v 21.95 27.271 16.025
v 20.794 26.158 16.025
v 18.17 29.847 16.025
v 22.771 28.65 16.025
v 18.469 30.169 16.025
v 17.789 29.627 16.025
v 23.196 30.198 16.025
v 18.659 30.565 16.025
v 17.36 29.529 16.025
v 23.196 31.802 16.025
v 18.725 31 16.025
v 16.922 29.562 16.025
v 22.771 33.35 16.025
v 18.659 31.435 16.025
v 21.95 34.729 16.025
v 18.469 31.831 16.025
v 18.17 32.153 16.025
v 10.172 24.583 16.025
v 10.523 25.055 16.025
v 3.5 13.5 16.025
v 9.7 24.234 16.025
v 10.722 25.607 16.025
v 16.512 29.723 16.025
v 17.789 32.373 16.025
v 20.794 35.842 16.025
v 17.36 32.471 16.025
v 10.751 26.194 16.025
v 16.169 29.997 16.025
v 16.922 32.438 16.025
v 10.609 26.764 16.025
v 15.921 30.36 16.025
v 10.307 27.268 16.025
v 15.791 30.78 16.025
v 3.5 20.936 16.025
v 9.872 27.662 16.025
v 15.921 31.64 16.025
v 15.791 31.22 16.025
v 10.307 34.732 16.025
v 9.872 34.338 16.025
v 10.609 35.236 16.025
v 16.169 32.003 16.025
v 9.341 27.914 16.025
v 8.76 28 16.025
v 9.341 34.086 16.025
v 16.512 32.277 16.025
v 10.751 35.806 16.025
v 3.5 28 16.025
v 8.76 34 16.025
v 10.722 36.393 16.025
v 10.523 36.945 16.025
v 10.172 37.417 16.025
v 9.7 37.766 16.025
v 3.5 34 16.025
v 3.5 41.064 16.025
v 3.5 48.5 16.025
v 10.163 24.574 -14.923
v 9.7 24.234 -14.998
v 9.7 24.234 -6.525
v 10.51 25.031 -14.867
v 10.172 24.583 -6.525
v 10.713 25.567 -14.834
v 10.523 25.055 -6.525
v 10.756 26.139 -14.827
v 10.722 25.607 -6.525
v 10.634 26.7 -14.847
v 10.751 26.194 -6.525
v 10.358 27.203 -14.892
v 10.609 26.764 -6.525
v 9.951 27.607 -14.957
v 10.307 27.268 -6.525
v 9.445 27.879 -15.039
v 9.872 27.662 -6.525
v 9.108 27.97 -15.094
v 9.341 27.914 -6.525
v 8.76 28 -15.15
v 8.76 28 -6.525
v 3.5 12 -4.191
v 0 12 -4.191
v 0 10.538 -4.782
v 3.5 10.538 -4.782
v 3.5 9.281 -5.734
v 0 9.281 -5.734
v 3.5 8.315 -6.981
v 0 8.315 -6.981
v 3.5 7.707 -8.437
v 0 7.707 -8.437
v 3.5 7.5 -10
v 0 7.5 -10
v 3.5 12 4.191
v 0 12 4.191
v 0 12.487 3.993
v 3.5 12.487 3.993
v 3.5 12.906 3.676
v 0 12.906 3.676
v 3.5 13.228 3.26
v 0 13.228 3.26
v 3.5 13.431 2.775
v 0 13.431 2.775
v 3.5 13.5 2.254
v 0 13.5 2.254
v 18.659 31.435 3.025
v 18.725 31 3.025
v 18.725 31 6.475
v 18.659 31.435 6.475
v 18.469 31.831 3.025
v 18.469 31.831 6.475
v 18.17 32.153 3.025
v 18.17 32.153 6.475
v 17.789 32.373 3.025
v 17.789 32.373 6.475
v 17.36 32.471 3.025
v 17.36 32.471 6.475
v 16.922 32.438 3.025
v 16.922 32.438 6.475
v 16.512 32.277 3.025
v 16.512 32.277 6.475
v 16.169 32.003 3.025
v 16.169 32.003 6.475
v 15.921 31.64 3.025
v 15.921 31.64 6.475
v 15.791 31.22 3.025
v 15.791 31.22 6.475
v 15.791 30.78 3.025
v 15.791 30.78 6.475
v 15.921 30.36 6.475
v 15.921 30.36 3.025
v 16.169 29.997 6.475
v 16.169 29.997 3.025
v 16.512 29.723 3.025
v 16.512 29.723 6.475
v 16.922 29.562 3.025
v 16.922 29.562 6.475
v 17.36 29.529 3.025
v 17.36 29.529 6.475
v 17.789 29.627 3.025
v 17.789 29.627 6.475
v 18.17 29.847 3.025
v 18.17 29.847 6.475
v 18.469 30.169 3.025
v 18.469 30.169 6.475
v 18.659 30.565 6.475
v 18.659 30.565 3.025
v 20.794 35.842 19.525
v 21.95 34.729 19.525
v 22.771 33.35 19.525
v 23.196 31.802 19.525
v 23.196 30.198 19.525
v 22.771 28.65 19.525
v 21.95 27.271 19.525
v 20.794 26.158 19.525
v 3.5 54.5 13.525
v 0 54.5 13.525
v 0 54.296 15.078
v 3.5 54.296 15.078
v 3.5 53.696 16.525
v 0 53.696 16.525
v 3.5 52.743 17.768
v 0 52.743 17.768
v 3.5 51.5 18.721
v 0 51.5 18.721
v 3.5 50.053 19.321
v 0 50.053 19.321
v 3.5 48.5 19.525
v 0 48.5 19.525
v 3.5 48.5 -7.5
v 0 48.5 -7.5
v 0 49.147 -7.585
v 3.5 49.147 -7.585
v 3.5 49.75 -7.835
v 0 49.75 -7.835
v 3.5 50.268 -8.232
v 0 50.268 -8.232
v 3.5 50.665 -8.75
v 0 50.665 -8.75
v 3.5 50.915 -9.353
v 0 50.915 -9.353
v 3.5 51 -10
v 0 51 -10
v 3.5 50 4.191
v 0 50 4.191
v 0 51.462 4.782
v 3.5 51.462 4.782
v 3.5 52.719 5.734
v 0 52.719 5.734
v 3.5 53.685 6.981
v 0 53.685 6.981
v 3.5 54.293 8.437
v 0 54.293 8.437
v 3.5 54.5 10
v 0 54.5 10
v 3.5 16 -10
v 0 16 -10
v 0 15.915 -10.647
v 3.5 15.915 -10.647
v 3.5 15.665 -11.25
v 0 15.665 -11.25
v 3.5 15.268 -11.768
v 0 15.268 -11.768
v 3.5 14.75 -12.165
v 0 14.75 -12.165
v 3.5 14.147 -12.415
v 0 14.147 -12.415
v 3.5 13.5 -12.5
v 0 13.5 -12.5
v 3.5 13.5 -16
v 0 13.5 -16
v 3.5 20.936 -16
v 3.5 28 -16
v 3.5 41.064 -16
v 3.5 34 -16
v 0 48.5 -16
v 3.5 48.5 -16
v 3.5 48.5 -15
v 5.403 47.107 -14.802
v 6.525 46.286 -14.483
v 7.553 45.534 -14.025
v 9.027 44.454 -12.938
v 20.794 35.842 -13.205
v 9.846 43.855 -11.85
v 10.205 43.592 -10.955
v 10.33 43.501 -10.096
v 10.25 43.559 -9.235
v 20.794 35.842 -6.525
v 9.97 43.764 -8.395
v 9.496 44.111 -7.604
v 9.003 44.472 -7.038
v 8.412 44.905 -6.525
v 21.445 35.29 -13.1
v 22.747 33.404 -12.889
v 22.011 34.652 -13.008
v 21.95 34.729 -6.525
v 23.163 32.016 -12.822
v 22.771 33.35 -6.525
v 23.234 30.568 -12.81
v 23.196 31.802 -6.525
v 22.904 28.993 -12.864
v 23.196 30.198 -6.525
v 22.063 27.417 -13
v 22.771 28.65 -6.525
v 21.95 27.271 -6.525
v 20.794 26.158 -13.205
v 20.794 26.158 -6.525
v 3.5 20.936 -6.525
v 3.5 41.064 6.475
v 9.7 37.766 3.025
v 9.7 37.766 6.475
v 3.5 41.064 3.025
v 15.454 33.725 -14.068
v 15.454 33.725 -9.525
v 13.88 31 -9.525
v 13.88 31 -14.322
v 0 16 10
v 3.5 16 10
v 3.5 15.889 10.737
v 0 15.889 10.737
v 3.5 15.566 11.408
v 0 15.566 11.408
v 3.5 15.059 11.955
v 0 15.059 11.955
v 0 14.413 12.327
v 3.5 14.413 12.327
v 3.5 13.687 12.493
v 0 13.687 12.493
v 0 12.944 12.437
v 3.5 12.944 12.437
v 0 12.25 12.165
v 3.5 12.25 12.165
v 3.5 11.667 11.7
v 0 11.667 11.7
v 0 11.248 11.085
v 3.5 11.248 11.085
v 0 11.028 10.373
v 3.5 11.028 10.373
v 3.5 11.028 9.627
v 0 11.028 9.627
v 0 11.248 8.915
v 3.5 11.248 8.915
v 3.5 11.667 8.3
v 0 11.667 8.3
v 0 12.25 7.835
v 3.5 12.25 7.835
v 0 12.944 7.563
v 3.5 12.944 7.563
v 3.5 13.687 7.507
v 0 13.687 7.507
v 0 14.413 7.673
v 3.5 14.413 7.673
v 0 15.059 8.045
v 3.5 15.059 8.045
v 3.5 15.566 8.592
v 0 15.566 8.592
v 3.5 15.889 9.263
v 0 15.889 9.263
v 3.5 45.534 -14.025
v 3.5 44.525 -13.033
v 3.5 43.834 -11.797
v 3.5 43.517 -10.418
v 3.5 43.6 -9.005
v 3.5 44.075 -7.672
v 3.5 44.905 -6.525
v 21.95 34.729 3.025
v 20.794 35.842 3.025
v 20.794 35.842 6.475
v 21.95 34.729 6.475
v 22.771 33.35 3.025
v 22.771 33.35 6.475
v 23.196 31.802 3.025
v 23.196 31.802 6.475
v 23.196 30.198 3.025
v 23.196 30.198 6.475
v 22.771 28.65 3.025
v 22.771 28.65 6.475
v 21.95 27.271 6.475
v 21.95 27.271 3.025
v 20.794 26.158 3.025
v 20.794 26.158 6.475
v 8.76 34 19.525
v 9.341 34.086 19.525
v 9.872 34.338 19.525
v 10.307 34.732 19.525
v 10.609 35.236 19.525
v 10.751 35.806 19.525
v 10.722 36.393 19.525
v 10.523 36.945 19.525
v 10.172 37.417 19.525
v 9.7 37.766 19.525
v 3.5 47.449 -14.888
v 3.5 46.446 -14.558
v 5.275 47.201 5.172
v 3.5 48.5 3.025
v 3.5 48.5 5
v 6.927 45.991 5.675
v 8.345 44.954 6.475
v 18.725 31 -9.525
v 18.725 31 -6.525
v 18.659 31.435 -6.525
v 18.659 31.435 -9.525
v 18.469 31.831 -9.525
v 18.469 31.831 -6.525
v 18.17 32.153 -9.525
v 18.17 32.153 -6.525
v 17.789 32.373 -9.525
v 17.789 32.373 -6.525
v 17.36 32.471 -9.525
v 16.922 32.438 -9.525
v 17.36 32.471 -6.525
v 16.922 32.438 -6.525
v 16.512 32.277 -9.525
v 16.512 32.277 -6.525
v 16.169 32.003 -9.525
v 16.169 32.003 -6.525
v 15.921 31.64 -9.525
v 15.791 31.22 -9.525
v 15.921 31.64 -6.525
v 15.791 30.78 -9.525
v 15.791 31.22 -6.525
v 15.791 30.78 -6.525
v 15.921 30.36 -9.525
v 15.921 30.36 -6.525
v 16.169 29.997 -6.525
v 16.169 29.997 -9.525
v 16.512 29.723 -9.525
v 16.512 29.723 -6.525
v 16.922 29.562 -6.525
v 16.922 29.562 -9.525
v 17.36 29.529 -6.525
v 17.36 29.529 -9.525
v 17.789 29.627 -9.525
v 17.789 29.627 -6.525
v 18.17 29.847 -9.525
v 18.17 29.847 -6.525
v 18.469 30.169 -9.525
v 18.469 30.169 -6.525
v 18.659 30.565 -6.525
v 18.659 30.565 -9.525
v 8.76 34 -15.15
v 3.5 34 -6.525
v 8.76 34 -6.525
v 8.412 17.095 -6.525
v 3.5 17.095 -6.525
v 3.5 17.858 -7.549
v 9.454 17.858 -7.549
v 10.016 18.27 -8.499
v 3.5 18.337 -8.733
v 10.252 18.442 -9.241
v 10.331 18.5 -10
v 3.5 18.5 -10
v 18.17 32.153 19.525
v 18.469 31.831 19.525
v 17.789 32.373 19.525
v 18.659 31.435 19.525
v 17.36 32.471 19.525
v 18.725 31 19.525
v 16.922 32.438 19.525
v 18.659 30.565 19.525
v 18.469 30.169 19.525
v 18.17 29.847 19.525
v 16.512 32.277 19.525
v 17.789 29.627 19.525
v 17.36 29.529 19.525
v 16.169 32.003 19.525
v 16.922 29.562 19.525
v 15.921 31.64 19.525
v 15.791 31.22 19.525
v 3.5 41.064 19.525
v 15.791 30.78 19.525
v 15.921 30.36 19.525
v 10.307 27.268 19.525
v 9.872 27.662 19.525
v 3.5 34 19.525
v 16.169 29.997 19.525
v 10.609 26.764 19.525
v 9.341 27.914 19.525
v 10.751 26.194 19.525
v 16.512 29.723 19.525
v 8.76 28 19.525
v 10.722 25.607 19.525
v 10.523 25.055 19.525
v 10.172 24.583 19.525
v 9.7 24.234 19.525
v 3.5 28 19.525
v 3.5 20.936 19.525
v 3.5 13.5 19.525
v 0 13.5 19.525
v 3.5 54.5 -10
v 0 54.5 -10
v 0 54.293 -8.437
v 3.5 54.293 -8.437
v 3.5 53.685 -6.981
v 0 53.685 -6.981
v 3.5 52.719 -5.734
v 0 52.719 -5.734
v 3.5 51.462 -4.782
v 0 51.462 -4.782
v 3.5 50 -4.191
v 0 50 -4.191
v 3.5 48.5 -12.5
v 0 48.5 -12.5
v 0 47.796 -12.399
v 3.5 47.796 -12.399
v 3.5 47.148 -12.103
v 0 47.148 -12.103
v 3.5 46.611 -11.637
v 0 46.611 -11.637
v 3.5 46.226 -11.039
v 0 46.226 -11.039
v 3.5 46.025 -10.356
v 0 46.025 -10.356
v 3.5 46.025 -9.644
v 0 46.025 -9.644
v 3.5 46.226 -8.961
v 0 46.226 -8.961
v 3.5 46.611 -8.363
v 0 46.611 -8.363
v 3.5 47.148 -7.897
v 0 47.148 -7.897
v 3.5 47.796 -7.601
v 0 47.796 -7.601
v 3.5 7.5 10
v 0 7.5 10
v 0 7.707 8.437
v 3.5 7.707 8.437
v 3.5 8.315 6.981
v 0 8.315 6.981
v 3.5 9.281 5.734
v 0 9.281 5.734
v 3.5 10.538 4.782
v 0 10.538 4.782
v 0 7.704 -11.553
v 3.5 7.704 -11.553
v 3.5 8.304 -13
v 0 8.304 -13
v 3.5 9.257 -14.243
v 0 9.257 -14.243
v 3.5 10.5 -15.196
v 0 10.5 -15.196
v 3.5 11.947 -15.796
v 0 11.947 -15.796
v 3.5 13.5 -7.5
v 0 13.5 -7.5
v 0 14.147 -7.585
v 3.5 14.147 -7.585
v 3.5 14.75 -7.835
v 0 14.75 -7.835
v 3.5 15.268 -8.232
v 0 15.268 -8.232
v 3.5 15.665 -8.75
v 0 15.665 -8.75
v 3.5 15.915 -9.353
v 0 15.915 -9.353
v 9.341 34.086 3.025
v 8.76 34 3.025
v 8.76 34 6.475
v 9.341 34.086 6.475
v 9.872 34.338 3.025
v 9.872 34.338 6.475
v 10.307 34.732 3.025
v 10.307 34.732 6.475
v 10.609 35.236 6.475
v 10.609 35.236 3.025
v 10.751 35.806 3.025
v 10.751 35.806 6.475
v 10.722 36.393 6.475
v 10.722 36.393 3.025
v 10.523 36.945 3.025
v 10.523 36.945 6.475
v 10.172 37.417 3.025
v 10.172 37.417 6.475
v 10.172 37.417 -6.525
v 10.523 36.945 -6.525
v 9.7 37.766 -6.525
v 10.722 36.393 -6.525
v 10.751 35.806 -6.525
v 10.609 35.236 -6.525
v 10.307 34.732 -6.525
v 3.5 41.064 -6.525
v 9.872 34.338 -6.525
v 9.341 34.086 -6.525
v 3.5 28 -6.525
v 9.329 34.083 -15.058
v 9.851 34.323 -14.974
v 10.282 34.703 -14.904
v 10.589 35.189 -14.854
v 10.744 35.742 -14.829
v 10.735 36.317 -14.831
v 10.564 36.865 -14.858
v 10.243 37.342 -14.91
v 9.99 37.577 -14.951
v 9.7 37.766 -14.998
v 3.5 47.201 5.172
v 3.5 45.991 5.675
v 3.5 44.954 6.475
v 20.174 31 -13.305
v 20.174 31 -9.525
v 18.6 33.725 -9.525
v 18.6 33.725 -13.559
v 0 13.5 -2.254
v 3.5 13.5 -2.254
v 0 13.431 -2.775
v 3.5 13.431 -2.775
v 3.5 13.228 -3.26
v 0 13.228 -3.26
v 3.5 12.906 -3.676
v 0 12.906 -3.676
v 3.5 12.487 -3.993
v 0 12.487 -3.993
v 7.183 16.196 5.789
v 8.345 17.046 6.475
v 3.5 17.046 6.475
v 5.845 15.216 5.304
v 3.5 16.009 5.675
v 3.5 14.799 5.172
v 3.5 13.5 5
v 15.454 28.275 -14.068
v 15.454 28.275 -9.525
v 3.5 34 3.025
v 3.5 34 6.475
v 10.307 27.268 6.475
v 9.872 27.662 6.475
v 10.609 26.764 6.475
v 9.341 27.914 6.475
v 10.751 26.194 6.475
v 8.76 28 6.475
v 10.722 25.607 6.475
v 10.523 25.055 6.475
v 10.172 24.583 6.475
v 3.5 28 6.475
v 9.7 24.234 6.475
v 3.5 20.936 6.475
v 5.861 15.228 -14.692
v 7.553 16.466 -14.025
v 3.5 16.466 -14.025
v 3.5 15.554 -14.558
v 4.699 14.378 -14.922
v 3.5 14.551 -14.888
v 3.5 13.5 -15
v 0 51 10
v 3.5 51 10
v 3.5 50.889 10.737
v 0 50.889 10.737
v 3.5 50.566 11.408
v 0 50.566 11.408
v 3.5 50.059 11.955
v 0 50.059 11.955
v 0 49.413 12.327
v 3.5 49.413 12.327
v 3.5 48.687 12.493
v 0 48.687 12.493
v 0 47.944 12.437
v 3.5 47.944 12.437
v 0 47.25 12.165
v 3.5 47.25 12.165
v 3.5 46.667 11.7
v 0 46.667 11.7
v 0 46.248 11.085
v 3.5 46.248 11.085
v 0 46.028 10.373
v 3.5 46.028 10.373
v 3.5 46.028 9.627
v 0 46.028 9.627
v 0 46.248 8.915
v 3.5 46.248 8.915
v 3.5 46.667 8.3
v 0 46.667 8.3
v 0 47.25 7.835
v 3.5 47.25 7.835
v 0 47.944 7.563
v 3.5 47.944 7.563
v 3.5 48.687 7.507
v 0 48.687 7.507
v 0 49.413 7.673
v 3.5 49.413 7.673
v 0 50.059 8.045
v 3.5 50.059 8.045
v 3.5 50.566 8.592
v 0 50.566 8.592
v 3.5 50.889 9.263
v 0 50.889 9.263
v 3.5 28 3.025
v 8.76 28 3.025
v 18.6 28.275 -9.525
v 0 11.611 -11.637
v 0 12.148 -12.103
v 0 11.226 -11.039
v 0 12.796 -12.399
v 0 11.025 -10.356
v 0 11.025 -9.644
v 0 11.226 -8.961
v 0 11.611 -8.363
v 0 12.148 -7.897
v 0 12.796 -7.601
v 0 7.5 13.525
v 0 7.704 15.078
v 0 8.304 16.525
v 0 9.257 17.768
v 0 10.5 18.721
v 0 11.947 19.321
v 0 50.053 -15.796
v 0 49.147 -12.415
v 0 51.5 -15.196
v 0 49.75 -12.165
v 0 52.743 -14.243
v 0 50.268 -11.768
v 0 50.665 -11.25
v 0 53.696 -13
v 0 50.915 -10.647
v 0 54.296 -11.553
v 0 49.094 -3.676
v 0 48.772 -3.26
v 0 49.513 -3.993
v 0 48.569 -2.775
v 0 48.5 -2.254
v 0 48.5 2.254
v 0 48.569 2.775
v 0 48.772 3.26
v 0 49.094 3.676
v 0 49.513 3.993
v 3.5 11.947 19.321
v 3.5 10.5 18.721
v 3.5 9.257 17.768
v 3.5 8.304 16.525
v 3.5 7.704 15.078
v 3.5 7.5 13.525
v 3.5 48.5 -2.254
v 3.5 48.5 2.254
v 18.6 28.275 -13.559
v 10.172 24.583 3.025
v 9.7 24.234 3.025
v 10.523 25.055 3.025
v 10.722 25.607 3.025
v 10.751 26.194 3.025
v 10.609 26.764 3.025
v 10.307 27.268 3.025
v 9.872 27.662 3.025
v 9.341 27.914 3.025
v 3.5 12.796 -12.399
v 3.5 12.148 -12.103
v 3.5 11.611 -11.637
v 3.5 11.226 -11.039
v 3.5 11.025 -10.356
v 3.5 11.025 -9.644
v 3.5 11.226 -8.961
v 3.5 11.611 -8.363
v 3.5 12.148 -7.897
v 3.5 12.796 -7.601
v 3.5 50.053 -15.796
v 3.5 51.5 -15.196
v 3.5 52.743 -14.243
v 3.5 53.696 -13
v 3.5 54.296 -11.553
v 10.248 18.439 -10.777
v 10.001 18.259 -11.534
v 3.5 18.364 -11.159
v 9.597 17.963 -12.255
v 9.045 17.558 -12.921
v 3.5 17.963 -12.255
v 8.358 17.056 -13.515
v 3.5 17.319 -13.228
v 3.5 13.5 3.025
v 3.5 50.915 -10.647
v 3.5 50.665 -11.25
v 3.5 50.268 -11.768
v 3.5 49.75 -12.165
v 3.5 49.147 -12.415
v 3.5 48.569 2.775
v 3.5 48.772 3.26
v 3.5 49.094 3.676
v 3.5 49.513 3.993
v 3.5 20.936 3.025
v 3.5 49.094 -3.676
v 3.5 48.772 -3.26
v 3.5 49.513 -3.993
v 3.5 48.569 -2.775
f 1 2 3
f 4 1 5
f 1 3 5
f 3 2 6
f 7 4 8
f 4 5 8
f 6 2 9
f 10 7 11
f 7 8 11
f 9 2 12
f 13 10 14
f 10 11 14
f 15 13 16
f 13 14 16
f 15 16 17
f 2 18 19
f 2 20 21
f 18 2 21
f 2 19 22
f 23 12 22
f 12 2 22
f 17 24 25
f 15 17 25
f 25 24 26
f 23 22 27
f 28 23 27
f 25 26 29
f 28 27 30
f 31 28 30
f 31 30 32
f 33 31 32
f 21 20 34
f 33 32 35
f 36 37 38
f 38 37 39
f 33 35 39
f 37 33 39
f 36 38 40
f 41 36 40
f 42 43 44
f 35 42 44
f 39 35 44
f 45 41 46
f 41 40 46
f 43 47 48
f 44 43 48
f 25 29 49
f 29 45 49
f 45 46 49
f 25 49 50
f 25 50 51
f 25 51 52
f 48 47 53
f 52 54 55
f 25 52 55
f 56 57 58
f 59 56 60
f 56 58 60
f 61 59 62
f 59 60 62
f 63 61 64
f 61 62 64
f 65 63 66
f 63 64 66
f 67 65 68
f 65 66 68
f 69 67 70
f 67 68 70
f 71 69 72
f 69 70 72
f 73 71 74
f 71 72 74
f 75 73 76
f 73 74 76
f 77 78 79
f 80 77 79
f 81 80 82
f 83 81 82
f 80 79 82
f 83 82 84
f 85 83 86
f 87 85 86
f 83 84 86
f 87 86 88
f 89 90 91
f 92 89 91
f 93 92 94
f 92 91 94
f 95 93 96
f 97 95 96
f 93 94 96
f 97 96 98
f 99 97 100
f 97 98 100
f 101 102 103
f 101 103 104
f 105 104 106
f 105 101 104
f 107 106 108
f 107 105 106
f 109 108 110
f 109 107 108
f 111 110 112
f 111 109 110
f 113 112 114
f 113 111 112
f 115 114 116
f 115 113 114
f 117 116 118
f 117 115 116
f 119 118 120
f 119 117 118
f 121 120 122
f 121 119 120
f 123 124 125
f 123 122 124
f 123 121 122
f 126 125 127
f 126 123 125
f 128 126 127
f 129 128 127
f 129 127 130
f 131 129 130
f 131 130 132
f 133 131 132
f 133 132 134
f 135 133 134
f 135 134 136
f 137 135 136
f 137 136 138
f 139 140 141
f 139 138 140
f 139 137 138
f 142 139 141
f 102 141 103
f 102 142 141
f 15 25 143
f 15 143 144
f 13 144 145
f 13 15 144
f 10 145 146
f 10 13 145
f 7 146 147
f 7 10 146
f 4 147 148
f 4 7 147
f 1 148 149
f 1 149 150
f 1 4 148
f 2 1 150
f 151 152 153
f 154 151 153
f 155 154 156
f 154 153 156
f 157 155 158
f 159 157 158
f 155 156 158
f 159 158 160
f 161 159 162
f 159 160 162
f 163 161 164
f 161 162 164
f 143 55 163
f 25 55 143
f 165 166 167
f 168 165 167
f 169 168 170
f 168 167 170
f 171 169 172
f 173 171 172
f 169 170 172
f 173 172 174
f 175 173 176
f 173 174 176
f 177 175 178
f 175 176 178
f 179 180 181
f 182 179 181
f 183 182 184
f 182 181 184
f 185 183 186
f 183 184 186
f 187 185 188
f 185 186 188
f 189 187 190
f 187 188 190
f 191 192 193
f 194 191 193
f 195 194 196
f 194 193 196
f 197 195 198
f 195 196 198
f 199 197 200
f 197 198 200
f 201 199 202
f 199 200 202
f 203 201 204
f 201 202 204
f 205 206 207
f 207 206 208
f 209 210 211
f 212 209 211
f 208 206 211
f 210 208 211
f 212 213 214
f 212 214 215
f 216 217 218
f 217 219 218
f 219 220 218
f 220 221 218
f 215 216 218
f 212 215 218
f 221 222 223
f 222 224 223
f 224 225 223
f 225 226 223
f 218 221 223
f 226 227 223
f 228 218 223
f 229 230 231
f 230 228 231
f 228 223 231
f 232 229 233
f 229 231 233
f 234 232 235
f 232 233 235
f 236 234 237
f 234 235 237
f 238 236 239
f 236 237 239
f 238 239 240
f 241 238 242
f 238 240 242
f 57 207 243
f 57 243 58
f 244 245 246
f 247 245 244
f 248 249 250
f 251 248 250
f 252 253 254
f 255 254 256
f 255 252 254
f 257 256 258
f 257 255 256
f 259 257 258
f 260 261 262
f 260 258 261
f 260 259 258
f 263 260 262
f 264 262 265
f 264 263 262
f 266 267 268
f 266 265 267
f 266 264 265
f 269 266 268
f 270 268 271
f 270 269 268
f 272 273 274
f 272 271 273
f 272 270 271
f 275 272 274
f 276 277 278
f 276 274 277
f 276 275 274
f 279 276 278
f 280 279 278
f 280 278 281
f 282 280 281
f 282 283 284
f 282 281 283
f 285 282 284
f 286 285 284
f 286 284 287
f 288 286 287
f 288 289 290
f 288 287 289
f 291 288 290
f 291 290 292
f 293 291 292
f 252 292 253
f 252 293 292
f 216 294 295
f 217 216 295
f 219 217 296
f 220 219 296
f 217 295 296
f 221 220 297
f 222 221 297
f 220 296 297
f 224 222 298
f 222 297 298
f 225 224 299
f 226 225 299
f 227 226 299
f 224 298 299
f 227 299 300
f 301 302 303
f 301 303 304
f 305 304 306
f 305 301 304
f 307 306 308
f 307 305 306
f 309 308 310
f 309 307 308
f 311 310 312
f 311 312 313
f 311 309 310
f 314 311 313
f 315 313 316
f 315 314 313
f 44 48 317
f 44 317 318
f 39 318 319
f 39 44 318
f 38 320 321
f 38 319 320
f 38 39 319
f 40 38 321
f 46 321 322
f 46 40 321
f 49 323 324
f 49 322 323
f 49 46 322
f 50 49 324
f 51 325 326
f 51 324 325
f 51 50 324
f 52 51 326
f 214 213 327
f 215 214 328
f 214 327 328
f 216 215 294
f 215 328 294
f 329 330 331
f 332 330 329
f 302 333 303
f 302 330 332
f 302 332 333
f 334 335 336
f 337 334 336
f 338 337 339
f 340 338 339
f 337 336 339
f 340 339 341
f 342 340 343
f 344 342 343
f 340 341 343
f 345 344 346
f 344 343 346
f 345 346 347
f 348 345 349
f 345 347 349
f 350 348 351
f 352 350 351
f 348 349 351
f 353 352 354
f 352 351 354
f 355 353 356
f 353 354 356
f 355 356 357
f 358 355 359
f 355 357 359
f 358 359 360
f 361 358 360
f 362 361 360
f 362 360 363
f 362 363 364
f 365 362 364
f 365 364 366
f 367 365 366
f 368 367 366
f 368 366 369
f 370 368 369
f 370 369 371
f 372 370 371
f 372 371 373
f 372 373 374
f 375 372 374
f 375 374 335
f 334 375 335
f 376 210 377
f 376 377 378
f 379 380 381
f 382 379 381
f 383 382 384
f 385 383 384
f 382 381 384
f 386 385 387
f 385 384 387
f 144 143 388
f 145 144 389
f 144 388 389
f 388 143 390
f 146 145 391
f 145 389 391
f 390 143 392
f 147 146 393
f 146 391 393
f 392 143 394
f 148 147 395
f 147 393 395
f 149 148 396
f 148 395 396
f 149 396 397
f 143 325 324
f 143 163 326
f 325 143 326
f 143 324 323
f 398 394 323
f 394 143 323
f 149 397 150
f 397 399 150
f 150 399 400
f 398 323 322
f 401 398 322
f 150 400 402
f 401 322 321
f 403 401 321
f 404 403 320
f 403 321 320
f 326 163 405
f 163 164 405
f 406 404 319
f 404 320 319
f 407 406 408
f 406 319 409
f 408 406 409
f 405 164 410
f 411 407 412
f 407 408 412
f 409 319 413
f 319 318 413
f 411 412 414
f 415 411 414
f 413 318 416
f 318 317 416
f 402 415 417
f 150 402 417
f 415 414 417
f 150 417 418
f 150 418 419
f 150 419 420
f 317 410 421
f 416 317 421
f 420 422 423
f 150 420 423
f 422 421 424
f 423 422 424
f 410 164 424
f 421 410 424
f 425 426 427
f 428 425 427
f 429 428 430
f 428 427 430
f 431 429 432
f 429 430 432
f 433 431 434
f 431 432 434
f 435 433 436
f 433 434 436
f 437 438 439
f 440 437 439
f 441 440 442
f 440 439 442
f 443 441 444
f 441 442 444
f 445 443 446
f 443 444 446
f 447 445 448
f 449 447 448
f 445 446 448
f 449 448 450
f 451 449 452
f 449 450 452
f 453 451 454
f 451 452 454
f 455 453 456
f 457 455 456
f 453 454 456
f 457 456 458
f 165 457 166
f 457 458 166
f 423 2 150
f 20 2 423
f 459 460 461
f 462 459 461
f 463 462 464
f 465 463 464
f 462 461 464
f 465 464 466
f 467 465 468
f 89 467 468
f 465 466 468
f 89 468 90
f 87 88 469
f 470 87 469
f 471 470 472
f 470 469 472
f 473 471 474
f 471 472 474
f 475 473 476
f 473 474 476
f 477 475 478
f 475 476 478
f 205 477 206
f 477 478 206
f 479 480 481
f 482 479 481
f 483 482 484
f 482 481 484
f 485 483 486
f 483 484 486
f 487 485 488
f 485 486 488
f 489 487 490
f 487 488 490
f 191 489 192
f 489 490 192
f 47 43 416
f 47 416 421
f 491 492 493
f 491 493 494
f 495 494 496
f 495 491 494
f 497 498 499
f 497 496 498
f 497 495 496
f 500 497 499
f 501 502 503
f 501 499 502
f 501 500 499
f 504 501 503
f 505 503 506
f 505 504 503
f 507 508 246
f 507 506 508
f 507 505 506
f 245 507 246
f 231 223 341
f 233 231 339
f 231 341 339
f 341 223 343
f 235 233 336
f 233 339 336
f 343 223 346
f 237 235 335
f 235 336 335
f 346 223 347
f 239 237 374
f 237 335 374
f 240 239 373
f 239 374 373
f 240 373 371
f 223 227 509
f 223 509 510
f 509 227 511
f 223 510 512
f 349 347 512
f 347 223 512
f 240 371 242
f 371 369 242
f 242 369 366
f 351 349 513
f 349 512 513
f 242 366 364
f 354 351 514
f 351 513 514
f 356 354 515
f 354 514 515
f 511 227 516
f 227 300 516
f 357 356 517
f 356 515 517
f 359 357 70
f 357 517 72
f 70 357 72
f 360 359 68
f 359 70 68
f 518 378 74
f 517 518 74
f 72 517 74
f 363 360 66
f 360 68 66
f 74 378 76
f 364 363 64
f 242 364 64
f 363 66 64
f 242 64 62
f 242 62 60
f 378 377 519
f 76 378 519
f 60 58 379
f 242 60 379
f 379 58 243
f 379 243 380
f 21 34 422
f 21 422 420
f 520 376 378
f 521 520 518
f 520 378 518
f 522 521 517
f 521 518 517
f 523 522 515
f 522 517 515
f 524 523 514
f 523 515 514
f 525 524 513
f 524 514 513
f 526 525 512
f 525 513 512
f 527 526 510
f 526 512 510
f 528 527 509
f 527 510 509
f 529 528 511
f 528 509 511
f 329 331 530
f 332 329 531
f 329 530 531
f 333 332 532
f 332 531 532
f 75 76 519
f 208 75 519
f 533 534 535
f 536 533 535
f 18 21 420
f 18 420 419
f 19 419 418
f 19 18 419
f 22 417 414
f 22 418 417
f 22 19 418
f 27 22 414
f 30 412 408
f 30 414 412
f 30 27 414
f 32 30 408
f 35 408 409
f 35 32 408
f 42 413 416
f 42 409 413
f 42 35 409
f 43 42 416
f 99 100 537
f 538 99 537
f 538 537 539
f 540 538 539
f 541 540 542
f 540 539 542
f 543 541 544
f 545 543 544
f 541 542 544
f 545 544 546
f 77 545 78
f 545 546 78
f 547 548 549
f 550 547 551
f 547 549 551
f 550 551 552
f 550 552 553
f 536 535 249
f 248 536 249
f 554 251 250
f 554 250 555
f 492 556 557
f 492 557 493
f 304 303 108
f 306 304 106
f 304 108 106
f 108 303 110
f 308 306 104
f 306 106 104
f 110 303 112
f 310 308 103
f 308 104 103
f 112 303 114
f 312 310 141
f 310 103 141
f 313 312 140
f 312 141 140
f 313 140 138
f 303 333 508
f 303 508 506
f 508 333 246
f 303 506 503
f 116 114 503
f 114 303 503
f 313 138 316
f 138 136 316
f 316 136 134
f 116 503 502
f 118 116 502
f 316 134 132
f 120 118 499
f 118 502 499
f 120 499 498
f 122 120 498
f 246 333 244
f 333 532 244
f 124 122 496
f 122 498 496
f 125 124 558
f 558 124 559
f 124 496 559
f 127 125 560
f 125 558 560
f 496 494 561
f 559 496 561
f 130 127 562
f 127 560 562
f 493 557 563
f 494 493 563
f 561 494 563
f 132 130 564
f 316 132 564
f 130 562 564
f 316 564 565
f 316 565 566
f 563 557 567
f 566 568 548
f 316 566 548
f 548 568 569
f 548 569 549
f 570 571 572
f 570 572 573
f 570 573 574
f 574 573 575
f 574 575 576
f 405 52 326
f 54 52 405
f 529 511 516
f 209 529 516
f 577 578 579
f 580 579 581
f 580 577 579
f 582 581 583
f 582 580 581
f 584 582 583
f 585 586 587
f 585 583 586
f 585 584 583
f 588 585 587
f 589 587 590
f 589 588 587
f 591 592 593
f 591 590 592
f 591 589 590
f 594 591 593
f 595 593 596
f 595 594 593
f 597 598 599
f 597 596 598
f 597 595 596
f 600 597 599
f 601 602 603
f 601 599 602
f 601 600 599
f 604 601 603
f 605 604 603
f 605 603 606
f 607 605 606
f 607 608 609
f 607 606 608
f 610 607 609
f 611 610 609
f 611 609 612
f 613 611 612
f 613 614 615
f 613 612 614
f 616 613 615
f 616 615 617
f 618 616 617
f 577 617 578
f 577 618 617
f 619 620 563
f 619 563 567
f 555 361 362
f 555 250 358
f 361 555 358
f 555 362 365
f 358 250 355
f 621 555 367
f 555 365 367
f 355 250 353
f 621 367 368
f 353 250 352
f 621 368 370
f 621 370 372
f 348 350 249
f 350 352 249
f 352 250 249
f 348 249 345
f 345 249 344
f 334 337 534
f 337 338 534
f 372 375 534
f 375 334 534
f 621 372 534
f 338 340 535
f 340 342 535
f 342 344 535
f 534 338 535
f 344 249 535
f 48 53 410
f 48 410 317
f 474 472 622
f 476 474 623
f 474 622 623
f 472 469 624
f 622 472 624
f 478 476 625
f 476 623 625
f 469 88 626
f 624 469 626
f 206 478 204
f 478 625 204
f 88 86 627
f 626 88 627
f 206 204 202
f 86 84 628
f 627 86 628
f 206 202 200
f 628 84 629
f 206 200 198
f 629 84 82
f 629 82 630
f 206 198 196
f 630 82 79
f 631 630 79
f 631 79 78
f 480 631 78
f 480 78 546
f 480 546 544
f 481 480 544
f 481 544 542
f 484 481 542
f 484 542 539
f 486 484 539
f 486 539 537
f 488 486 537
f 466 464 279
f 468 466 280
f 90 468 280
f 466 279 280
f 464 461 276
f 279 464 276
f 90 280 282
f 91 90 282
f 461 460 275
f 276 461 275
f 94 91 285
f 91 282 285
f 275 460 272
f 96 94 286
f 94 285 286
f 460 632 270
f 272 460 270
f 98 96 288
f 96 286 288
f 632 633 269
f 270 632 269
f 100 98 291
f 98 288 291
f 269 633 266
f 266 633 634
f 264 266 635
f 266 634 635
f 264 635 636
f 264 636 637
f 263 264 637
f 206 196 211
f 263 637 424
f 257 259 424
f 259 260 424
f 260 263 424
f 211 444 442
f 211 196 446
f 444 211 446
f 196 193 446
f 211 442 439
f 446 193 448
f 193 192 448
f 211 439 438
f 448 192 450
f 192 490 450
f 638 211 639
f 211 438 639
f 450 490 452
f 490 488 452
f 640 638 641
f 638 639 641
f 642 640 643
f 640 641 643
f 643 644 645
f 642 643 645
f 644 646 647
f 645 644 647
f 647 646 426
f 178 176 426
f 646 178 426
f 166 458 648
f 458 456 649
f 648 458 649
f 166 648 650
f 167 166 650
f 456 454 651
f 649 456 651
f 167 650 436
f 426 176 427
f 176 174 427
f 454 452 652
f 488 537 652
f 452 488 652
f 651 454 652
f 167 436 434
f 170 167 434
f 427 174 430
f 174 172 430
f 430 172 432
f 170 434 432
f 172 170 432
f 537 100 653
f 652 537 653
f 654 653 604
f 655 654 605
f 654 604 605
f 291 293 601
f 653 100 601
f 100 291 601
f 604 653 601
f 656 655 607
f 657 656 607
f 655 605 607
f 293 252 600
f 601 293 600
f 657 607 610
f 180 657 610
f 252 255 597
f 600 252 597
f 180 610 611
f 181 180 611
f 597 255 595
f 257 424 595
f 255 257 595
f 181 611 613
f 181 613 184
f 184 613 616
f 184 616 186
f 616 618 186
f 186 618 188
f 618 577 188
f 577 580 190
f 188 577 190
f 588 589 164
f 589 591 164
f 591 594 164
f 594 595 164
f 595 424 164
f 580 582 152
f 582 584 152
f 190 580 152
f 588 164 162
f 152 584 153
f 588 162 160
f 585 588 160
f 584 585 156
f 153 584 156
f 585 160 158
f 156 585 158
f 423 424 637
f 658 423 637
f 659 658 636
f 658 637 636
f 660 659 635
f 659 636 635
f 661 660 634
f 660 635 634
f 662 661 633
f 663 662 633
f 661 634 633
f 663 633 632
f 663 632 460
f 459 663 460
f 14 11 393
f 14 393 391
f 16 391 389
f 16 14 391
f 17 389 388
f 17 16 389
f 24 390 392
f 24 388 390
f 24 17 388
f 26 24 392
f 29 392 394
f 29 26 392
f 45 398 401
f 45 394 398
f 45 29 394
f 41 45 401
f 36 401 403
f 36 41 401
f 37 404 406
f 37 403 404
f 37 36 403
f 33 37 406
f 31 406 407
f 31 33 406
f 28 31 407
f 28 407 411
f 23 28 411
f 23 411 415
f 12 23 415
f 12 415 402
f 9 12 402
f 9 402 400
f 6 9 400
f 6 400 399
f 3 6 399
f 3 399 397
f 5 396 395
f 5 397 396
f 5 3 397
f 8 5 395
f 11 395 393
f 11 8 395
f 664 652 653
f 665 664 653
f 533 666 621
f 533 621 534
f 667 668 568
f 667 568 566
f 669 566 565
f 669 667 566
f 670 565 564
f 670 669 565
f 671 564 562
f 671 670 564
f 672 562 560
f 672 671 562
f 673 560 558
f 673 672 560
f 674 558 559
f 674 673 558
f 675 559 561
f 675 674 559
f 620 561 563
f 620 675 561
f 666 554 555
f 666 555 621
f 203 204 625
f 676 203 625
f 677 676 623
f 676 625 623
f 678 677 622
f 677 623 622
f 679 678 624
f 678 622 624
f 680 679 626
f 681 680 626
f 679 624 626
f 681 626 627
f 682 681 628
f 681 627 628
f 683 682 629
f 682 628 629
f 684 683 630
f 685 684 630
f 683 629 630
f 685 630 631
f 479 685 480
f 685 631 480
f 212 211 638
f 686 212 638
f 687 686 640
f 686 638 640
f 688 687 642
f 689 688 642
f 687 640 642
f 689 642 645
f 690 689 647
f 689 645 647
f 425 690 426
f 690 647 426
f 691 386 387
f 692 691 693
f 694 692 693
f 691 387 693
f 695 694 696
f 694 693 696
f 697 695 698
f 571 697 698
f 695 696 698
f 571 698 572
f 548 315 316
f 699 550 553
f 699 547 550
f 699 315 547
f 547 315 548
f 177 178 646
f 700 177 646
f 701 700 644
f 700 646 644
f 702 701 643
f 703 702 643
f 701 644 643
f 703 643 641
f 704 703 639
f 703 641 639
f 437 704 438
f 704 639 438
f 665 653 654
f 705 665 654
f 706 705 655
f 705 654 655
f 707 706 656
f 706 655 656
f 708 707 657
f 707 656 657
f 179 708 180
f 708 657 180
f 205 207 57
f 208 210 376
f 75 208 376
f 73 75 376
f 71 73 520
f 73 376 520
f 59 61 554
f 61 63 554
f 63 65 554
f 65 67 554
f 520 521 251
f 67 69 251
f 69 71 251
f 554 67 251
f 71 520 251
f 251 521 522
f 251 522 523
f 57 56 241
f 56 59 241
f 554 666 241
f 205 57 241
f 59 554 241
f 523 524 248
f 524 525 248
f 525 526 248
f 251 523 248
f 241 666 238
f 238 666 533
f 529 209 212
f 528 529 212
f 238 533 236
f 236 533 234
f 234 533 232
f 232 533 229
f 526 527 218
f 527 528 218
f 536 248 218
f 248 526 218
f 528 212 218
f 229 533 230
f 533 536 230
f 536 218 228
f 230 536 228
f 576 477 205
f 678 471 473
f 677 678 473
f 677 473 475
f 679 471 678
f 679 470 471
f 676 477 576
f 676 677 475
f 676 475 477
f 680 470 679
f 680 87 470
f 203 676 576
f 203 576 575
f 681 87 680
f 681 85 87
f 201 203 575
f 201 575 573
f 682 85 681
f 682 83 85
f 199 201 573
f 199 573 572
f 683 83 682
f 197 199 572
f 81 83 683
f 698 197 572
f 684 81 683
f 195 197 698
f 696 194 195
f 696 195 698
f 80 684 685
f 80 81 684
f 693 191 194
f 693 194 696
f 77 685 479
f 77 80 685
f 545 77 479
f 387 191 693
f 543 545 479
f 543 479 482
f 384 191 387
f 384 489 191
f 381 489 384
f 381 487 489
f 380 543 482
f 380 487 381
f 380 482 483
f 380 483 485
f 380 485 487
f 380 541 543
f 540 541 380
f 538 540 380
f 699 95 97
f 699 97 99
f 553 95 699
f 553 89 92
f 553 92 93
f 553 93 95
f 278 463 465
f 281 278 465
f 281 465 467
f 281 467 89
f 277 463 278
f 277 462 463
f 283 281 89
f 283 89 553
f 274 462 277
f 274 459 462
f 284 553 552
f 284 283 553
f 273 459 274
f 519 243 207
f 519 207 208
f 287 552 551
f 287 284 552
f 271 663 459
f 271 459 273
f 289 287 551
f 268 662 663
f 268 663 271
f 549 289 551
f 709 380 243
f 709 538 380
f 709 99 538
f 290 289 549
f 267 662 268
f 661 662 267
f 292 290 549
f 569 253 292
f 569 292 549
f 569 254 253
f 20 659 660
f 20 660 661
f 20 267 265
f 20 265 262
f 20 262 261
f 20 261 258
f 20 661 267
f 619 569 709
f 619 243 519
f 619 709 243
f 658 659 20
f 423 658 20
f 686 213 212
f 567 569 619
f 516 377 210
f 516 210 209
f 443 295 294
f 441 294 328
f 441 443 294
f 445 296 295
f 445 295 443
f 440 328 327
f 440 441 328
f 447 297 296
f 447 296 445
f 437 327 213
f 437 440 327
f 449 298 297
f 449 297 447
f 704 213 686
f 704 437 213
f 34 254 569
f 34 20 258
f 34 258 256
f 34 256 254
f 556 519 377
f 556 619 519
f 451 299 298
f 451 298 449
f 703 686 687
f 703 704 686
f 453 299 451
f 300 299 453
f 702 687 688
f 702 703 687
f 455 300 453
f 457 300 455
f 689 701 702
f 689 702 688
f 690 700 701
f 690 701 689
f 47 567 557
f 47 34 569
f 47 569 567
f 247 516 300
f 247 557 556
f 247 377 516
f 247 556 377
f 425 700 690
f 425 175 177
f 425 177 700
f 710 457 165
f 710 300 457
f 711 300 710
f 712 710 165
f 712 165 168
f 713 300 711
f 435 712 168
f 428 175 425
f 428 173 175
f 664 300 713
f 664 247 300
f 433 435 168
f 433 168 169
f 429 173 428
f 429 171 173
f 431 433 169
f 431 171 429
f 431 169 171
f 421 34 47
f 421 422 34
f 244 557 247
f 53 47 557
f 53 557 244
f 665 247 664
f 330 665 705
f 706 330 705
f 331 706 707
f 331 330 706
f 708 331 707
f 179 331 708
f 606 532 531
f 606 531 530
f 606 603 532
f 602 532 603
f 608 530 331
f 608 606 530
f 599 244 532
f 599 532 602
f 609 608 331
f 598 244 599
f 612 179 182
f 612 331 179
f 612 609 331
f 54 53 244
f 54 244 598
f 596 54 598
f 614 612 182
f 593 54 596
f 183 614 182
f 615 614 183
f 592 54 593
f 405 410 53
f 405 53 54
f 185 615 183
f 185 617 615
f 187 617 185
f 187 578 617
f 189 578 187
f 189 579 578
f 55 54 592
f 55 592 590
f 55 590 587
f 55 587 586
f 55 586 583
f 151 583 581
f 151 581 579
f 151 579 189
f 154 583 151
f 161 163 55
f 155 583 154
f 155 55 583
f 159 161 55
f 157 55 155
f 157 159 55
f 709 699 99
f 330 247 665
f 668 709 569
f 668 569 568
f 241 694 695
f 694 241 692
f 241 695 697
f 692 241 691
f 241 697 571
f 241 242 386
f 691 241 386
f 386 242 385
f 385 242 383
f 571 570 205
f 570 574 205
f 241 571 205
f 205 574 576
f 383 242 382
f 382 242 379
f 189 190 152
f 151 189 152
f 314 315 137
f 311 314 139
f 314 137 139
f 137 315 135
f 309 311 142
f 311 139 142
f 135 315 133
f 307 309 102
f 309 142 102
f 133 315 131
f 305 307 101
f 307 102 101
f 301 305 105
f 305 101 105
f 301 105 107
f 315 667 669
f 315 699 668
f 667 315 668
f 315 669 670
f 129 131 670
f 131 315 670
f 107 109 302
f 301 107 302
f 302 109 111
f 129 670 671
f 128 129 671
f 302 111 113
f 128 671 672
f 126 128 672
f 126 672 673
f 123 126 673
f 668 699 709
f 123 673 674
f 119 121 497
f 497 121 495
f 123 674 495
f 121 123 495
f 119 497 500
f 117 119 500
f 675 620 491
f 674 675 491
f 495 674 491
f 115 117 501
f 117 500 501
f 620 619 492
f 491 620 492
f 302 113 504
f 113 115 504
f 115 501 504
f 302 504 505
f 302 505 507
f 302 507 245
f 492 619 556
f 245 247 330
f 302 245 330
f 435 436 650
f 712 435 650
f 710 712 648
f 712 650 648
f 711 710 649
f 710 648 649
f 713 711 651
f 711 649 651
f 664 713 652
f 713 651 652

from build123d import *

# Parameters (mm, degrees)
F0_R          = 2.5
F1_DEPTH      = 3.5
F0_W          = 5.5
F0_H          = 4
F2_DEPTH      = 25
F4_DEPTH      = 47.001
F5_R          = 1.475
F6_DEPTH      = 16.001
F6_DEPTH_BACK = 19.526
F8_R          = 1.475
F9_DEPTH      = 6.476


with BuildPart() as f1:
    # F0 (on Right) → F1 (new body)
    with BuildSketch(Plane.YZ):
        with BuildLine():
            Line((48.5, -15), (48.5, -16))
            ThreePointArc((48.5, -16), (52.7426406871, -14.2426406871), (54.5, -10))
            ThreePointArc((54.5, -10), (53.2434164903, -6.3257653858), (50, -4.1905249807))
            ThreePointArc((50, -4.1905249807), (48.9188611699, -3.478778179), (48.5, -2.2540333076))
            Line((48.5, -2.2540333076), (48.5, 2.2540333076))
            ThreePointArc((48.5, 2.2540333076), (48.9188611699, 3.478778179), (50, 4.1905249807))
            ThreePointArc((50, 4.1905249807), (53.2434164903, 6.3257653858), (54.5, 10))
            Line((54.5, 10), (54.5, 13.525))
            ThreePointArc((54.5, 13.525), (52.7426406871, 17.7676406871), (48.5, 19.525))
            Line((48.5, 19.525), (48.5, 16.025))
            Line((48.5, 16.025), (13.5, 16.025))
            Line((13.5, 16.025), (13.5, 19.525))
            ThreePointArc((13.5, 19.525), (9.2573593129, 17.7676406871), (7.5, 13.525))
            Line((7.5, 13.525), (7.5, 10))
            ThreePointArc((7.5, 10), (8.7565835097, 6.3257653858), (12, 4.1905249807))
            ThreePointArc((12, 4.1905249807), (13.0811388301, 3.478778179), (13.5, 2.2540333076))
            Line((13.5, 2.2540333076), (13.5, -2.2540333076))
            ThreePointArc((13.5, -2.2540333076), (13.0811388301, -3.478778179), (12, -4.1905249807))
            ThreePointArc((12, -4.1905249807), (8.7565835097, -6.3257653858), (7.5, -10))
            ThreePointArc((7.5, -10), (9.2573593129, -14.2426406871), (13.5, -16))
            Line((13.5, -16), (13.5, -15))
            ThreePointArc((13.5, -15), (8.8970118401, -8.047437581), (17.0950486784, -6.525))
            Line((17.0950486784, -6.525), (44.9049513216, -6.525))
            ThreePointArc((44.9049513216, -6.525), (50.3741340144, -5.3645257313), (53.5, -10))
            ThreePointArc((53.5, -10), (52.0355339059, -13.5355339059), (48.5, -15))
        make_face()
        with BuildLine():
            ThreePointArc((44.9539634802, 6.475), (46.5934563471, 14.6222387757), (53.5, 10))
            ThreePointArc((53.5, 10), (52.0355339059, 6.4644660941), (48.5, 5))
            Line((48.5, 5), (48.5, 3.025))
            Line((48.5, 3.025), (13.5, 3.025))
            Line((13.5, 3.025), (13.5, 5))
            ThreePointArc((13.5, 5), (9.9644660941, 13.5355339059), (18.5, 10))
            ThreePointArc((18.5, 10), (18.1222387757, 8.0934563471), (17.0460365198, 6.475))
            Line((17.0460365198, 6.475), (27.575, 6.475))
            Line((27.575, 6.475), (34.425, 6.475))
            Line((34.425, 6.475), (44.9539634802, 6.475))
        make_face(mode=Mode.SUBTRACT)
        with BuildLine():
            ThreePointArc((48.5, 5), (52.0355339059, 6.4644660941), (53.5, 10))
            ThreePointArc((53.5, 10), (46.5934563471, 14.6222387757), (44.9539634802, 6.475))
            Line((44.9539634802, 6.475), (48.5, 6.475))
            Line((48.5, 6.475), (48.5, 5))
        make_face()
        with Locations((48.5, 10)):
            Circle(F0_R, mode=Mode.SUBTRACT)
        with BuildLine():
            Line((13.5, 6.475), (17.0460365198, 6.475))
            ThreePointArc((17.0460365198, 6.475), (18.1222387757, 8.0934563471), (18.5, 10))
            ThreePointArc((18.5, 10), (9.9644660941, 13.5355339059), (13.5, 5))
            Line((13.5, 5), (13.5, 6.475))
        make_face()
        with Locations((13.5, 10)):
            Circle(F0_R, mode=Mode.SUBTRACT)
        with BuildLine():
            Line((48.5, -14.025), (48.5, -15))
            ThreePointArc((48.5, -15), (52.0355339059, -13.5355339059), (53.5, -10))
            ThreePointArc((53.5, -10), (50.3741340144, -5.3645257313), (44.9049513216, -6.525))
            Line((44.9049513216, -6.525), (48.5, -6.525))
            Line((48.5, -6.525), (48.5, -7.5))
            ThreePointArc((48.5, -7.5), (50.267766953, -8.232233047), (51, -10))
            ThreePointArc((51, -10), (50.267766953, -11.767766953), (48.5, -12.5))
            Line((48.5, -12.5), (48.5, -14.025))
        make_face()
        with BuildLine():
            ThreePointArc((17.0950486784, -6.525), (8.8970118401, -8.047437581), (13.5, -15))
            Line((13.5, -15), (13.5, -14.025))
            Line((13.5, -14.025), (13.5, -12.5))
            ThreePointArc((13.5, -12.5), (11, -10), (13.5, -7.5))
            Line((13.5, -7.5), (13.5, -6.525))
            Line((13.5, -6.525), (17.0950486784, -6.525))
        make_face()
        with BuildLine():
            ThreePointArc((44.9049513216, -6.525), (43.5174738282, -10.4176517058), (45.5336259508, -14.025))
            Line((45.5336259508, -14.025), (48.5, -14.025))
            Line((48.5, -14.025), (48.5, -12.5))
            ThreePointArc((48.5, -12.5), (46, -10), (48.5, -7.5))
            Line((48.5, -7.5), (48.5, -6.525))
            Line((48.5, -6.525), (44.9049513216, -6.525))
        make_face()
        with BuildLine():
            ThreePointArc((18.5, -10), (18.1354742687, -8.1258659856), (17.0950486784, -6.525))
            Line((17.0950486784, -6.525), (13.5, -6.525))
            Line((13.5, -6.525), (13.5, -7.5))
            ThreePointArc((13.5, -7.5), (15.267766953, -8.232233047), (16, -10))
            ThreePointArc((16, -10), (15.267766953, -11.767766953), (13.5, -12.5))
            Line((13.5, -12.5), (13.5, -14.025))
            Line((13.5, -14.025), (16.4663740492, -14.025))
            ThreePointArc((16.4663740492, -14.025), (17.9627273189, -12.2547871023), (18.5, -10))
        make_face()
        with BuildLine():
            ThreePointArc((13.5, 5), (15.420286437, 5.3834536718), (17.0460365198, 6.475))
            Line((17.0460365198, 6.475), (13.5, 6.475))
            Line((13.5, 6.475), (13.5, 5))
        make_face()
        with BuildLine():
            Line((48.5, 6.475), (44.9539634802, 6.475))
            ThreePointArc((44.9539634802, 6.475), (46.579713563, 5.3834536718), (48.5, 5))
            Line((48.5, 5), (48.5, 6.475))
        make_face()
        with BuildLine():
            ThreePointArc((45.5336259508, -14.025), (46.9387505004, -14.75), (48.5, -15))
            Line((48.5, -15), (48.5, -14.025))
            Line((48.5, -14.025), (45.5336259508, -14.025))
        make_face()
        with BuildLine():
            Line((13.5, -14.025), (13.5, -15))
            ThreePointArc((13.5, -15), (15.0612494996, -14.75), (16.4663740492, -14.025))
            Line((16.4663740492, -14.025), (13.5, -14.025))
        make_face()
    extrude(amount=F1_DEPTH)

    # F0 (on Right) → F2 (join)
    with BuildSketch(Plane.YZ):
        with Locations((31, -12.025)):
            Rectangle(F0_W, F0_H)
        with BuildLine():
            ThreePointArc((48.5, 5), (46.579713563, 5.3834536718), (44.9539634802, 6.475))
            Line((44.9539634802, 6.475), (34.425, 6.475))
            Line((34.425, 6.475), (27.575, 6.475))
            Line((27.575, 6.475), (17.0460365198, 6.475))
            ThreePointArc((17.0460365198, 6.475), (15.420286437, 5.3834536718), (13.5, 5))
            Line((13.5, 5), (13.5, 3.025))
            Line((13.5, 3.025), (48.5, 3.025))
            Line((48.5, 3.025), (48.5, 5))
        make_face()
        Polygon((48.5, 16.025), (48.5, 19.525), (35.4, 19.525), (26.6, 19.525), (13.5, 19.525), (13.5, 16.025), align=None)
        with BuildLine():
            Line((33.75, -14.025), (45.5336259508, -14.025))
            ThreePointArc((45.5336259508, -14.025), (43.5174738282, -10.4176517058), (44.9049513216, -6.525))
            Line((44.9049513216, -6.525), (17.0950486784, -6.525))
            ThreePointArc((17.0950486784, -6.525), (18.1354742687, -8.1258659856), (18.5, -10))
            ThreePointArc((18.5, -10), (17.9627273189, -12.2547871023), (16.4663740492, -14.025))
            Line((16.4663740492, -14.025), (28.25, -14.025))
            Line((28.25, -14.025), (28.25, -10.025))
            Line((28.25, -10.025), (33.75, -10.025))
            Line((33.75, -10.025), (33.75, -14.025))
        make_face()
        with BuildLine():
            Line((13.5, -16), (48.5, -16))
            Line((48.5, -16), (48.5, -15))
            ThreePointArc((48.5, -15), (46.9387505004, -14.75), (45.5336259508, -14.025))
            Line((45.5336259508, -14.025), (33.75, -14.025))
            Line((33.75, -14.025), (28.25, -14.025))
            Line((28.25, -14.025), (16.4663740492, -14.025))
            ThreePointArc((16.4663740492, -14.025), (15.0612494996, -14.75), (13.5, -15))
            Line((13.5, -15), (13.5, -16))
        make_face()
    extrude(amount=F2_DEPTH)

    # F3 (on face) → F4 (cut, through all)
    with BuildSketch(Plane(origin=(0, 54.5, 0), x_dir=(-1, 0, 0), z_dir=(0, 1, 0))):
        Polygon((-25, -12.525), (-25, -16), (-3.5, -16), align=None)
    extrude(amount=-F4_DEPTH, mode=Mode.SUBTRACT)

    # F5 (on Top) → F6 (cut, two sides)
    with BuildSketch(Plane.XY) as f6_sk:
        with BuildLine():
            ThreePointArc((20.7938548449, 35.8416002353), (23.25, 31), (20.7938548449, 26.1583997647))
            Line((20.7938548449, 26.1583997647), (3.5, 13.5))
            Line((3.5, 13.5), (25, 13.5))
            Line((25, 13.5), (25, 48.5))
            Line((25, 48.5), (3.5, 48.5))
            Line((3.5, 48.5), (20.7938548449, 35.8416002353))
        make_face()
        with Locations((17.25, 31)):
            Circle(F5_R)
        with BuildLine():
            Line((9.6998989998, 37.7656271516), (3.5, 41.0644418683))
            Line((3.5, 41.0644418683), (3.5, 34))
            Line((3.5, 34), (8.7604519489, 34))
            ThreePointArc((8.7604519489, 34), (10.7009743403, 35.5158793039), (9.6998989998, 37.7656271516))
        make_face()
        with BuildLine():
            Line((3.5, 28), (3.5, 20.9355581317))
            Line((3.5, 20.9355581317), (9.6998989998, 24.2343728484))
            ThreePointArc((9.6998989998, 24.2343728484), (10.7009743403, 26.4841206961), (8.7604519489, 28))
            Line((8.7604519489, 28), (3.5, 28))
        make_face()
    extrude(amount=-F6_DEPTH, mode=Mode.SUBTRACT)
    extrude(f6_sk.sketch, amount=F6_DEPTH_BACK, mode=Mode.SUBTRACT)

    # F8 (on offset) → F9 (cut, through all)
    with BuildSketch(Plane.XY.offset(-9.525)):
        Polygon((20.173566383, 31), (18.6002868994, 33.725), (15.4537279323, 33.725), (13.8804484488, 31), (15.4537279323, 28.275), (18.6002868994, 28.275), align=None)
        with Locations((17.25, 31)):
            Circle(F8_R, mode=Mode.SUBTRACT)
    extrude(amount=-F9_DEPTH, mode=Mode.SUBTRACT)


solid = f1.part
